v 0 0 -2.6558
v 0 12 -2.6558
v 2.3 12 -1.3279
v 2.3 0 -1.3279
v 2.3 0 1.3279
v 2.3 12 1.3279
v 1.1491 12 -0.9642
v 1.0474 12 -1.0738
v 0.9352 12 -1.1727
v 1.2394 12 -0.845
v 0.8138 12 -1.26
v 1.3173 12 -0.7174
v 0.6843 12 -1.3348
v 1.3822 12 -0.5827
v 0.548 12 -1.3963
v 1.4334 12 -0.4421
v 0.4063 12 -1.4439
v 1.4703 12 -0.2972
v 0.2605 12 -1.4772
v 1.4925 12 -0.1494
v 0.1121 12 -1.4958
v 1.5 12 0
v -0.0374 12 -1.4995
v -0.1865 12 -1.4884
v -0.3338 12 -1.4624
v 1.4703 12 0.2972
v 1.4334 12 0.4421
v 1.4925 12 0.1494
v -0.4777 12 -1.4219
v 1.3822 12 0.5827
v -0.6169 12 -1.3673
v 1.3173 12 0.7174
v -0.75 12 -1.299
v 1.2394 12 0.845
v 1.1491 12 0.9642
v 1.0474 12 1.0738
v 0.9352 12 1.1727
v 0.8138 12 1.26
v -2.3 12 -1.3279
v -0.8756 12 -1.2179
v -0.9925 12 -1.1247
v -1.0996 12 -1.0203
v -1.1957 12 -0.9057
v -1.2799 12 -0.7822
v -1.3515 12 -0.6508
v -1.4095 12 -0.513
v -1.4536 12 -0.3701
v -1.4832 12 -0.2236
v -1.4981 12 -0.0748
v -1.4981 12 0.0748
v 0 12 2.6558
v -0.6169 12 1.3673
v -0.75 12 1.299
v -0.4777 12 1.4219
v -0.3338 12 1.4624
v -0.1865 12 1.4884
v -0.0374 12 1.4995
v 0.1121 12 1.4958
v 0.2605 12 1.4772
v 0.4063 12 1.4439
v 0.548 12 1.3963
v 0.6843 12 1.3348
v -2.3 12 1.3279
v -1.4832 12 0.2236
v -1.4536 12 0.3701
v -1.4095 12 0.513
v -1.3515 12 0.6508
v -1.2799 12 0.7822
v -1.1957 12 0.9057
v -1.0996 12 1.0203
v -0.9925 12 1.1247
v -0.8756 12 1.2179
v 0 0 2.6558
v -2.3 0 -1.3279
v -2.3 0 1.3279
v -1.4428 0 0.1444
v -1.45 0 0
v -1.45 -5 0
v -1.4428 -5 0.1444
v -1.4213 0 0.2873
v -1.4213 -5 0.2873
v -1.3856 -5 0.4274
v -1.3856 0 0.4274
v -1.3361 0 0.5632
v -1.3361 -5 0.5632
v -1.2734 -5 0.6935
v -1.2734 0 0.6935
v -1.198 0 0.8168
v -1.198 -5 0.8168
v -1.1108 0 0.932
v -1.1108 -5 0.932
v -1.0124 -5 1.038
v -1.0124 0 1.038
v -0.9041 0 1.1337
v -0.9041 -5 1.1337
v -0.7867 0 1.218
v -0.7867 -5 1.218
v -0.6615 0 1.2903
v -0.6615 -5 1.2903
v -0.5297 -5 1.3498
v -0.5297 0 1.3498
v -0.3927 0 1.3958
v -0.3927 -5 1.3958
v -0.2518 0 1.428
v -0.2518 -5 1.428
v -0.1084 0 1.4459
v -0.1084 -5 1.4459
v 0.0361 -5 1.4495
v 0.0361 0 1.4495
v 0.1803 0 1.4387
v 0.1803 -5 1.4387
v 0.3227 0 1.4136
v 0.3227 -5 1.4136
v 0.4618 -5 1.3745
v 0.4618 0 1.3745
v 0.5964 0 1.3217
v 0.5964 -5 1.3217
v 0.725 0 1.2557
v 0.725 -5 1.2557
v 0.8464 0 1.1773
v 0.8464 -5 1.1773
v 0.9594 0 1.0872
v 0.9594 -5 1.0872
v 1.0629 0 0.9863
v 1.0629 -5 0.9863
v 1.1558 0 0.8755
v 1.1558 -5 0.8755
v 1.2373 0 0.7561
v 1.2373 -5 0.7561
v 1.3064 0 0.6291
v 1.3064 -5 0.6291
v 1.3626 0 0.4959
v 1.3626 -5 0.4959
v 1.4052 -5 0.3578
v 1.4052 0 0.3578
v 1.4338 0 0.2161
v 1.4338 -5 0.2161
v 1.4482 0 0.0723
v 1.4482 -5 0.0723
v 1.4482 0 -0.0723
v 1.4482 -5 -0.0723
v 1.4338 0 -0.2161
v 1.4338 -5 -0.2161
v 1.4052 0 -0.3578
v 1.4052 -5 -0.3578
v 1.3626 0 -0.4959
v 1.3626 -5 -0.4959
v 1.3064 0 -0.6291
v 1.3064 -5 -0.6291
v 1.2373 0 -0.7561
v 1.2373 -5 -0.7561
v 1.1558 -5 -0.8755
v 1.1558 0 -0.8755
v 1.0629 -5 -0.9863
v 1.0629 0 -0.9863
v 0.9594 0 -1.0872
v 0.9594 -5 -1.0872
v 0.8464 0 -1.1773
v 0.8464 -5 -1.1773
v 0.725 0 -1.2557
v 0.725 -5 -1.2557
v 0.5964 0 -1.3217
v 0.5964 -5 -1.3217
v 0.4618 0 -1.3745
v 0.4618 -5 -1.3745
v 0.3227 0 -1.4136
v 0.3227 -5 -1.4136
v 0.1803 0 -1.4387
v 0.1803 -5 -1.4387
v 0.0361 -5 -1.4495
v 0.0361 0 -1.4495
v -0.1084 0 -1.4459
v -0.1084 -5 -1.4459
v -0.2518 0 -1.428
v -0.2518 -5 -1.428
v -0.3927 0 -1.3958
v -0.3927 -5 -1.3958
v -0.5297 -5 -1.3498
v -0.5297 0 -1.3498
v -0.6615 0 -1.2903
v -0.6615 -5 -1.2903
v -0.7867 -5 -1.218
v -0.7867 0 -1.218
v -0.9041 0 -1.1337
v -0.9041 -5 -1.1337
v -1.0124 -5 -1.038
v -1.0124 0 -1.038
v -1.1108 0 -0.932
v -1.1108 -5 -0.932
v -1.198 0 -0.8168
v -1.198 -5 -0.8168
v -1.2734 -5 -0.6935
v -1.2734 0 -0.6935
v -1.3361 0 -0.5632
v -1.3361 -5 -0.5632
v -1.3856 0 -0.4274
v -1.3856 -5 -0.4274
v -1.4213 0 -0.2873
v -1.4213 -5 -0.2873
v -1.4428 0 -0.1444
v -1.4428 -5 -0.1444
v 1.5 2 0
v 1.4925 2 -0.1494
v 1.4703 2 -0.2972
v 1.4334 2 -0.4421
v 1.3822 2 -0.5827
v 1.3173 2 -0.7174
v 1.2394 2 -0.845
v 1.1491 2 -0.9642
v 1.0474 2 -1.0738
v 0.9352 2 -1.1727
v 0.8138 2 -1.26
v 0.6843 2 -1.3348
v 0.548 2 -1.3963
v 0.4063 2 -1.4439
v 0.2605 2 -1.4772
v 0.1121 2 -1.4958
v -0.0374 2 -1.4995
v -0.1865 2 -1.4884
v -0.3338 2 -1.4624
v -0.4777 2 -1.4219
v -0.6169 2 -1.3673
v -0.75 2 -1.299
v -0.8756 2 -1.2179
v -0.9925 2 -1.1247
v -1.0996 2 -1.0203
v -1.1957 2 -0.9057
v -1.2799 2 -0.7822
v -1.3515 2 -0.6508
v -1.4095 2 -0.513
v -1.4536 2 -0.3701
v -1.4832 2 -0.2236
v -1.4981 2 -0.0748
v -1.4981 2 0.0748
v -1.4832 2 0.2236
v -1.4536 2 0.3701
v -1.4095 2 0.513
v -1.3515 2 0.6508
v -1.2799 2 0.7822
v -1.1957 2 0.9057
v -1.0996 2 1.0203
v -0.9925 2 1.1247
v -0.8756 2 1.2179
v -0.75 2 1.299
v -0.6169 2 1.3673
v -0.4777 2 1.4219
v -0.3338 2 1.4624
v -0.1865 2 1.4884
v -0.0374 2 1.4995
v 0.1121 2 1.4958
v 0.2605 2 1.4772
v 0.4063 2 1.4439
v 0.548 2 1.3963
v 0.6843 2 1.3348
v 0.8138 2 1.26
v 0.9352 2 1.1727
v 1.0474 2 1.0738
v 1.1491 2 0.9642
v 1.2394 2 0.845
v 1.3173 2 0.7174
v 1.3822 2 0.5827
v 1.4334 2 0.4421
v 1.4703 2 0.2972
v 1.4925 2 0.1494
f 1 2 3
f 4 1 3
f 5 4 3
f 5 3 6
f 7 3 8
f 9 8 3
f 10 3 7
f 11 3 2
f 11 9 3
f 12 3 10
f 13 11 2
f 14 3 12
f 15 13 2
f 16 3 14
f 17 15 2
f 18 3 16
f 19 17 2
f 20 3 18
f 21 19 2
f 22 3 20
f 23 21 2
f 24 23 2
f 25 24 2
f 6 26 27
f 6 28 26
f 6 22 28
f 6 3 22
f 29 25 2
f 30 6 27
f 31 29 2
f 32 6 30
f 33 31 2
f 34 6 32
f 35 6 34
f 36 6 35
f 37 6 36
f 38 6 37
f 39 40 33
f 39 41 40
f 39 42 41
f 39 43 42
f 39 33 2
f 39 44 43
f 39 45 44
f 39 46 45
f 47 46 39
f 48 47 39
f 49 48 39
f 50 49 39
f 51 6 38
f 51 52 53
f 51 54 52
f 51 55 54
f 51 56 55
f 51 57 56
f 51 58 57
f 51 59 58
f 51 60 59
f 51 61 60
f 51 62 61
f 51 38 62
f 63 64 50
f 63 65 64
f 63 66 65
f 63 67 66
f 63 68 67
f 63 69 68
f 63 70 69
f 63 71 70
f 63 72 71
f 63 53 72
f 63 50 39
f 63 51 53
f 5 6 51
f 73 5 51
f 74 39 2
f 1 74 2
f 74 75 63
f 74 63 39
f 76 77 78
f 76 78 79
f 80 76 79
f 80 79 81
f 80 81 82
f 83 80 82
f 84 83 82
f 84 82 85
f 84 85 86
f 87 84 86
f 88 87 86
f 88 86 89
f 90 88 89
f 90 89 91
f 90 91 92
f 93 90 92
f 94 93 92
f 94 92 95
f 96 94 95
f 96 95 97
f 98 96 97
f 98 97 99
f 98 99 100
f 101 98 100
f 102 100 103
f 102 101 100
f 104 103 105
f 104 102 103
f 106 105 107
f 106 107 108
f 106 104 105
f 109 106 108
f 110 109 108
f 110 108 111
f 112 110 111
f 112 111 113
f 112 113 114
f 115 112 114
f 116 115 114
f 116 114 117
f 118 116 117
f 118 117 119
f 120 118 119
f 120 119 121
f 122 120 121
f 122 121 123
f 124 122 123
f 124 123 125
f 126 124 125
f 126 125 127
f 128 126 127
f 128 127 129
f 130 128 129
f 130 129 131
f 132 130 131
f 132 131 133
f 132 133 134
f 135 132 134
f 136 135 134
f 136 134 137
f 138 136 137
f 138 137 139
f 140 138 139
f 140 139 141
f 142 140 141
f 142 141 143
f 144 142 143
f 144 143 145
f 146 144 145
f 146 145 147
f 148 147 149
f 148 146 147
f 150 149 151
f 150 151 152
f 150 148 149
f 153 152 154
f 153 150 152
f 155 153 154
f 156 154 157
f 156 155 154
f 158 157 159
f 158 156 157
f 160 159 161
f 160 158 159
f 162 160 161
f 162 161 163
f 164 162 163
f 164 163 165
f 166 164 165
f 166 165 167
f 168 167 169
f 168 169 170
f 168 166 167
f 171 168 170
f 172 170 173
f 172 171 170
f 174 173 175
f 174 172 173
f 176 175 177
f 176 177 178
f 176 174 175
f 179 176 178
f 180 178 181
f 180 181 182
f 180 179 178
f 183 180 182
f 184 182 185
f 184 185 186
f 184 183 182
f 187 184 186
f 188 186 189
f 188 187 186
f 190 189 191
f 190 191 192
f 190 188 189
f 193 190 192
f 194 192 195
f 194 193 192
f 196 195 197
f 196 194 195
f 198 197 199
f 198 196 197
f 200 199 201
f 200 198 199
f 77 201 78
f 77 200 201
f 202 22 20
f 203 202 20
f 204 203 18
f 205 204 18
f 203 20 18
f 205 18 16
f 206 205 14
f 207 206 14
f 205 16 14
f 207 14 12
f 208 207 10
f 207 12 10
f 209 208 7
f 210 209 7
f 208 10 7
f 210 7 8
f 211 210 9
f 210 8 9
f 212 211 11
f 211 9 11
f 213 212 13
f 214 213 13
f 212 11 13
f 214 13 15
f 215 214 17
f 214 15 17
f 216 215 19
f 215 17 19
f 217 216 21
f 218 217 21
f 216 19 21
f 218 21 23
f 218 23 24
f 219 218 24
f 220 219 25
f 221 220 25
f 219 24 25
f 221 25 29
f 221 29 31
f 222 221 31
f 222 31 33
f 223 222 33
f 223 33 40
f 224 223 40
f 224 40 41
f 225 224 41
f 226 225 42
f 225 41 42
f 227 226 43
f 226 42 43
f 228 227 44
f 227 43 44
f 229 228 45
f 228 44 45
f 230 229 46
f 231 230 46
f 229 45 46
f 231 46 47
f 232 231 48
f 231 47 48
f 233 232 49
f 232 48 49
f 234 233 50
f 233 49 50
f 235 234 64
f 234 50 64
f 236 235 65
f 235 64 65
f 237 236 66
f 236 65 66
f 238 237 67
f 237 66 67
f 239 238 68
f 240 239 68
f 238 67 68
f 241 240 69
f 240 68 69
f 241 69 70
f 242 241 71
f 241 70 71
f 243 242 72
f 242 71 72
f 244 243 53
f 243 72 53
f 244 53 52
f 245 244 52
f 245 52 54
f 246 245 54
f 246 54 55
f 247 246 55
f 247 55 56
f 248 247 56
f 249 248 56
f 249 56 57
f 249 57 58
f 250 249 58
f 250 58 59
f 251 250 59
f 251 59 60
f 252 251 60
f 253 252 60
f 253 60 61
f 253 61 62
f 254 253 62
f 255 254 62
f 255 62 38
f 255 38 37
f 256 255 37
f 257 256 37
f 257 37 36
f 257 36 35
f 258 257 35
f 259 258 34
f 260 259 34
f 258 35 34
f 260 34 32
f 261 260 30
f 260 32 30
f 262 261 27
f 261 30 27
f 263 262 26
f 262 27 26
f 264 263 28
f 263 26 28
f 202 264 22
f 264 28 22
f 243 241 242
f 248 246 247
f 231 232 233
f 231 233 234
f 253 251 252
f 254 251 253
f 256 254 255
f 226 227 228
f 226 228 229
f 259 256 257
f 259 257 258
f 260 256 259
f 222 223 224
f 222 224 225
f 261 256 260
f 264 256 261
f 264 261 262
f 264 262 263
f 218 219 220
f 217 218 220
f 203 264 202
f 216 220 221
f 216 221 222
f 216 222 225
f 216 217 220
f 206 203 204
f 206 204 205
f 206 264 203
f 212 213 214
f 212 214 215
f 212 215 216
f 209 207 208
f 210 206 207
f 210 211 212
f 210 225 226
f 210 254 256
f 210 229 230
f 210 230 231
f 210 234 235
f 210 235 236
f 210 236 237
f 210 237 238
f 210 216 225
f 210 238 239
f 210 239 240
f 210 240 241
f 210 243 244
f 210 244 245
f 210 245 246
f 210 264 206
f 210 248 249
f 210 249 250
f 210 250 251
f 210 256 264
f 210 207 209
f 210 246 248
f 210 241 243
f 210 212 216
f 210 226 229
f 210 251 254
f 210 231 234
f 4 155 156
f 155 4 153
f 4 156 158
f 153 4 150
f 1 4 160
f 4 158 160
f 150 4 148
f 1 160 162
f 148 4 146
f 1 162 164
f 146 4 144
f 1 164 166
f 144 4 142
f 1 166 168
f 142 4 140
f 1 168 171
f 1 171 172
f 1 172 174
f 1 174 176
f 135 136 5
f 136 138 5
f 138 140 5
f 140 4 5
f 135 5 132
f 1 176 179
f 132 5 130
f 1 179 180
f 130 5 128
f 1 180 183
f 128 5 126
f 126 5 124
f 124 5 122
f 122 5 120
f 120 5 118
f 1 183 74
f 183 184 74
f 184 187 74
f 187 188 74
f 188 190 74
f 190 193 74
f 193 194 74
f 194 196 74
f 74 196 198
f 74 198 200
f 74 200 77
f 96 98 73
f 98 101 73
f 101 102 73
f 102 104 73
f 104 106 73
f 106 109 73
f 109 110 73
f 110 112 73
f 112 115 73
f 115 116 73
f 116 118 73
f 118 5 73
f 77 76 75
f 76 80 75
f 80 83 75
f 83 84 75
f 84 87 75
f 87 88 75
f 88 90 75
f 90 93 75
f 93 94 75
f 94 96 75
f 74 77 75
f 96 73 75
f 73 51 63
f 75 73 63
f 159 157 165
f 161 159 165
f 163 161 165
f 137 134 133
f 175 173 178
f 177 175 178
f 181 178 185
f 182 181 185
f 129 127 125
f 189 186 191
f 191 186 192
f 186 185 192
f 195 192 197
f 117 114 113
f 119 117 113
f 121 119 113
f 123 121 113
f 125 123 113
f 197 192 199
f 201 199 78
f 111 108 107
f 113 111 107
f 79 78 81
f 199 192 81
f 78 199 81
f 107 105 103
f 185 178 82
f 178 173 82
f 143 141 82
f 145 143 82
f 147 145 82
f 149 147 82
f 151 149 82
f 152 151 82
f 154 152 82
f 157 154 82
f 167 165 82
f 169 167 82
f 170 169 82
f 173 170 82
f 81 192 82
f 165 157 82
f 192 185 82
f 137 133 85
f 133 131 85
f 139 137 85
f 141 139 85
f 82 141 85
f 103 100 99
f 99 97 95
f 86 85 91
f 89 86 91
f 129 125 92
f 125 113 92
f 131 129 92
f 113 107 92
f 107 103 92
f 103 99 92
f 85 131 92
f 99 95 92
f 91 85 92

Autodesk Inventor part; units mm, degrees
ref_plane "YZ Plane" through (0, 0, 0) normal (1, 0, 0) x (0, 1, 0)
ref_plane "XZ Plane" through (0, 0, 0) normal (0, 1, 0) x (-1, 0, 0)
ref_plane "XY Plane" through (0, 0, 0) normal (0, 0, 1) x (1, 0, 0)
sketch "Sketch1" plane through (0, 0, 0) normal (0, 1, 0) x (-1, 0, 0)
  line L0 (0, -2.6558) -> (-2.3, -1.3279)
  line L1 (-2.3, -1.3279) -> (-2.3, 1.3279)
  line L2 (-2.3, 1.3279) -> (0, 2.6558)
  line L3 (0, 2.6558) -> (2.3, 1.3279)
  line L4 (2.3, 1.3279) -> (2.3, -1.3279)
  line L5 (2.3, -1.3279) -> (0, -2.6558)
  circle A0 centre (0, 0) radius 1.45
  dimension "d4" = 2.9
  dimension "d5" = 4.6
extrude "Extrusion1" add sketch "Sketch1" along normal blind 12 contours L0 L1 L2 L3 L4 L5 | A0
extrude "Extrusion2" add sketch "Sketch1" against normal blind 5 contours A0
sketch "Sketch2" plane through (0, 12, 0) normal (0, 1, 0) x (1, 0, 0)
  circle A0 centre (0, 0) radius 1.45 projected
  circle A1 centre (0, 0) radius 1.45 projected
  circle A2 centre (0, 0) radius 1.5
  dimension "d6" = 3
extrude "Extrusion3" cut sketch "Sketch2" against normal blind 10 contours A0 | A2
properties part number "mounting"
